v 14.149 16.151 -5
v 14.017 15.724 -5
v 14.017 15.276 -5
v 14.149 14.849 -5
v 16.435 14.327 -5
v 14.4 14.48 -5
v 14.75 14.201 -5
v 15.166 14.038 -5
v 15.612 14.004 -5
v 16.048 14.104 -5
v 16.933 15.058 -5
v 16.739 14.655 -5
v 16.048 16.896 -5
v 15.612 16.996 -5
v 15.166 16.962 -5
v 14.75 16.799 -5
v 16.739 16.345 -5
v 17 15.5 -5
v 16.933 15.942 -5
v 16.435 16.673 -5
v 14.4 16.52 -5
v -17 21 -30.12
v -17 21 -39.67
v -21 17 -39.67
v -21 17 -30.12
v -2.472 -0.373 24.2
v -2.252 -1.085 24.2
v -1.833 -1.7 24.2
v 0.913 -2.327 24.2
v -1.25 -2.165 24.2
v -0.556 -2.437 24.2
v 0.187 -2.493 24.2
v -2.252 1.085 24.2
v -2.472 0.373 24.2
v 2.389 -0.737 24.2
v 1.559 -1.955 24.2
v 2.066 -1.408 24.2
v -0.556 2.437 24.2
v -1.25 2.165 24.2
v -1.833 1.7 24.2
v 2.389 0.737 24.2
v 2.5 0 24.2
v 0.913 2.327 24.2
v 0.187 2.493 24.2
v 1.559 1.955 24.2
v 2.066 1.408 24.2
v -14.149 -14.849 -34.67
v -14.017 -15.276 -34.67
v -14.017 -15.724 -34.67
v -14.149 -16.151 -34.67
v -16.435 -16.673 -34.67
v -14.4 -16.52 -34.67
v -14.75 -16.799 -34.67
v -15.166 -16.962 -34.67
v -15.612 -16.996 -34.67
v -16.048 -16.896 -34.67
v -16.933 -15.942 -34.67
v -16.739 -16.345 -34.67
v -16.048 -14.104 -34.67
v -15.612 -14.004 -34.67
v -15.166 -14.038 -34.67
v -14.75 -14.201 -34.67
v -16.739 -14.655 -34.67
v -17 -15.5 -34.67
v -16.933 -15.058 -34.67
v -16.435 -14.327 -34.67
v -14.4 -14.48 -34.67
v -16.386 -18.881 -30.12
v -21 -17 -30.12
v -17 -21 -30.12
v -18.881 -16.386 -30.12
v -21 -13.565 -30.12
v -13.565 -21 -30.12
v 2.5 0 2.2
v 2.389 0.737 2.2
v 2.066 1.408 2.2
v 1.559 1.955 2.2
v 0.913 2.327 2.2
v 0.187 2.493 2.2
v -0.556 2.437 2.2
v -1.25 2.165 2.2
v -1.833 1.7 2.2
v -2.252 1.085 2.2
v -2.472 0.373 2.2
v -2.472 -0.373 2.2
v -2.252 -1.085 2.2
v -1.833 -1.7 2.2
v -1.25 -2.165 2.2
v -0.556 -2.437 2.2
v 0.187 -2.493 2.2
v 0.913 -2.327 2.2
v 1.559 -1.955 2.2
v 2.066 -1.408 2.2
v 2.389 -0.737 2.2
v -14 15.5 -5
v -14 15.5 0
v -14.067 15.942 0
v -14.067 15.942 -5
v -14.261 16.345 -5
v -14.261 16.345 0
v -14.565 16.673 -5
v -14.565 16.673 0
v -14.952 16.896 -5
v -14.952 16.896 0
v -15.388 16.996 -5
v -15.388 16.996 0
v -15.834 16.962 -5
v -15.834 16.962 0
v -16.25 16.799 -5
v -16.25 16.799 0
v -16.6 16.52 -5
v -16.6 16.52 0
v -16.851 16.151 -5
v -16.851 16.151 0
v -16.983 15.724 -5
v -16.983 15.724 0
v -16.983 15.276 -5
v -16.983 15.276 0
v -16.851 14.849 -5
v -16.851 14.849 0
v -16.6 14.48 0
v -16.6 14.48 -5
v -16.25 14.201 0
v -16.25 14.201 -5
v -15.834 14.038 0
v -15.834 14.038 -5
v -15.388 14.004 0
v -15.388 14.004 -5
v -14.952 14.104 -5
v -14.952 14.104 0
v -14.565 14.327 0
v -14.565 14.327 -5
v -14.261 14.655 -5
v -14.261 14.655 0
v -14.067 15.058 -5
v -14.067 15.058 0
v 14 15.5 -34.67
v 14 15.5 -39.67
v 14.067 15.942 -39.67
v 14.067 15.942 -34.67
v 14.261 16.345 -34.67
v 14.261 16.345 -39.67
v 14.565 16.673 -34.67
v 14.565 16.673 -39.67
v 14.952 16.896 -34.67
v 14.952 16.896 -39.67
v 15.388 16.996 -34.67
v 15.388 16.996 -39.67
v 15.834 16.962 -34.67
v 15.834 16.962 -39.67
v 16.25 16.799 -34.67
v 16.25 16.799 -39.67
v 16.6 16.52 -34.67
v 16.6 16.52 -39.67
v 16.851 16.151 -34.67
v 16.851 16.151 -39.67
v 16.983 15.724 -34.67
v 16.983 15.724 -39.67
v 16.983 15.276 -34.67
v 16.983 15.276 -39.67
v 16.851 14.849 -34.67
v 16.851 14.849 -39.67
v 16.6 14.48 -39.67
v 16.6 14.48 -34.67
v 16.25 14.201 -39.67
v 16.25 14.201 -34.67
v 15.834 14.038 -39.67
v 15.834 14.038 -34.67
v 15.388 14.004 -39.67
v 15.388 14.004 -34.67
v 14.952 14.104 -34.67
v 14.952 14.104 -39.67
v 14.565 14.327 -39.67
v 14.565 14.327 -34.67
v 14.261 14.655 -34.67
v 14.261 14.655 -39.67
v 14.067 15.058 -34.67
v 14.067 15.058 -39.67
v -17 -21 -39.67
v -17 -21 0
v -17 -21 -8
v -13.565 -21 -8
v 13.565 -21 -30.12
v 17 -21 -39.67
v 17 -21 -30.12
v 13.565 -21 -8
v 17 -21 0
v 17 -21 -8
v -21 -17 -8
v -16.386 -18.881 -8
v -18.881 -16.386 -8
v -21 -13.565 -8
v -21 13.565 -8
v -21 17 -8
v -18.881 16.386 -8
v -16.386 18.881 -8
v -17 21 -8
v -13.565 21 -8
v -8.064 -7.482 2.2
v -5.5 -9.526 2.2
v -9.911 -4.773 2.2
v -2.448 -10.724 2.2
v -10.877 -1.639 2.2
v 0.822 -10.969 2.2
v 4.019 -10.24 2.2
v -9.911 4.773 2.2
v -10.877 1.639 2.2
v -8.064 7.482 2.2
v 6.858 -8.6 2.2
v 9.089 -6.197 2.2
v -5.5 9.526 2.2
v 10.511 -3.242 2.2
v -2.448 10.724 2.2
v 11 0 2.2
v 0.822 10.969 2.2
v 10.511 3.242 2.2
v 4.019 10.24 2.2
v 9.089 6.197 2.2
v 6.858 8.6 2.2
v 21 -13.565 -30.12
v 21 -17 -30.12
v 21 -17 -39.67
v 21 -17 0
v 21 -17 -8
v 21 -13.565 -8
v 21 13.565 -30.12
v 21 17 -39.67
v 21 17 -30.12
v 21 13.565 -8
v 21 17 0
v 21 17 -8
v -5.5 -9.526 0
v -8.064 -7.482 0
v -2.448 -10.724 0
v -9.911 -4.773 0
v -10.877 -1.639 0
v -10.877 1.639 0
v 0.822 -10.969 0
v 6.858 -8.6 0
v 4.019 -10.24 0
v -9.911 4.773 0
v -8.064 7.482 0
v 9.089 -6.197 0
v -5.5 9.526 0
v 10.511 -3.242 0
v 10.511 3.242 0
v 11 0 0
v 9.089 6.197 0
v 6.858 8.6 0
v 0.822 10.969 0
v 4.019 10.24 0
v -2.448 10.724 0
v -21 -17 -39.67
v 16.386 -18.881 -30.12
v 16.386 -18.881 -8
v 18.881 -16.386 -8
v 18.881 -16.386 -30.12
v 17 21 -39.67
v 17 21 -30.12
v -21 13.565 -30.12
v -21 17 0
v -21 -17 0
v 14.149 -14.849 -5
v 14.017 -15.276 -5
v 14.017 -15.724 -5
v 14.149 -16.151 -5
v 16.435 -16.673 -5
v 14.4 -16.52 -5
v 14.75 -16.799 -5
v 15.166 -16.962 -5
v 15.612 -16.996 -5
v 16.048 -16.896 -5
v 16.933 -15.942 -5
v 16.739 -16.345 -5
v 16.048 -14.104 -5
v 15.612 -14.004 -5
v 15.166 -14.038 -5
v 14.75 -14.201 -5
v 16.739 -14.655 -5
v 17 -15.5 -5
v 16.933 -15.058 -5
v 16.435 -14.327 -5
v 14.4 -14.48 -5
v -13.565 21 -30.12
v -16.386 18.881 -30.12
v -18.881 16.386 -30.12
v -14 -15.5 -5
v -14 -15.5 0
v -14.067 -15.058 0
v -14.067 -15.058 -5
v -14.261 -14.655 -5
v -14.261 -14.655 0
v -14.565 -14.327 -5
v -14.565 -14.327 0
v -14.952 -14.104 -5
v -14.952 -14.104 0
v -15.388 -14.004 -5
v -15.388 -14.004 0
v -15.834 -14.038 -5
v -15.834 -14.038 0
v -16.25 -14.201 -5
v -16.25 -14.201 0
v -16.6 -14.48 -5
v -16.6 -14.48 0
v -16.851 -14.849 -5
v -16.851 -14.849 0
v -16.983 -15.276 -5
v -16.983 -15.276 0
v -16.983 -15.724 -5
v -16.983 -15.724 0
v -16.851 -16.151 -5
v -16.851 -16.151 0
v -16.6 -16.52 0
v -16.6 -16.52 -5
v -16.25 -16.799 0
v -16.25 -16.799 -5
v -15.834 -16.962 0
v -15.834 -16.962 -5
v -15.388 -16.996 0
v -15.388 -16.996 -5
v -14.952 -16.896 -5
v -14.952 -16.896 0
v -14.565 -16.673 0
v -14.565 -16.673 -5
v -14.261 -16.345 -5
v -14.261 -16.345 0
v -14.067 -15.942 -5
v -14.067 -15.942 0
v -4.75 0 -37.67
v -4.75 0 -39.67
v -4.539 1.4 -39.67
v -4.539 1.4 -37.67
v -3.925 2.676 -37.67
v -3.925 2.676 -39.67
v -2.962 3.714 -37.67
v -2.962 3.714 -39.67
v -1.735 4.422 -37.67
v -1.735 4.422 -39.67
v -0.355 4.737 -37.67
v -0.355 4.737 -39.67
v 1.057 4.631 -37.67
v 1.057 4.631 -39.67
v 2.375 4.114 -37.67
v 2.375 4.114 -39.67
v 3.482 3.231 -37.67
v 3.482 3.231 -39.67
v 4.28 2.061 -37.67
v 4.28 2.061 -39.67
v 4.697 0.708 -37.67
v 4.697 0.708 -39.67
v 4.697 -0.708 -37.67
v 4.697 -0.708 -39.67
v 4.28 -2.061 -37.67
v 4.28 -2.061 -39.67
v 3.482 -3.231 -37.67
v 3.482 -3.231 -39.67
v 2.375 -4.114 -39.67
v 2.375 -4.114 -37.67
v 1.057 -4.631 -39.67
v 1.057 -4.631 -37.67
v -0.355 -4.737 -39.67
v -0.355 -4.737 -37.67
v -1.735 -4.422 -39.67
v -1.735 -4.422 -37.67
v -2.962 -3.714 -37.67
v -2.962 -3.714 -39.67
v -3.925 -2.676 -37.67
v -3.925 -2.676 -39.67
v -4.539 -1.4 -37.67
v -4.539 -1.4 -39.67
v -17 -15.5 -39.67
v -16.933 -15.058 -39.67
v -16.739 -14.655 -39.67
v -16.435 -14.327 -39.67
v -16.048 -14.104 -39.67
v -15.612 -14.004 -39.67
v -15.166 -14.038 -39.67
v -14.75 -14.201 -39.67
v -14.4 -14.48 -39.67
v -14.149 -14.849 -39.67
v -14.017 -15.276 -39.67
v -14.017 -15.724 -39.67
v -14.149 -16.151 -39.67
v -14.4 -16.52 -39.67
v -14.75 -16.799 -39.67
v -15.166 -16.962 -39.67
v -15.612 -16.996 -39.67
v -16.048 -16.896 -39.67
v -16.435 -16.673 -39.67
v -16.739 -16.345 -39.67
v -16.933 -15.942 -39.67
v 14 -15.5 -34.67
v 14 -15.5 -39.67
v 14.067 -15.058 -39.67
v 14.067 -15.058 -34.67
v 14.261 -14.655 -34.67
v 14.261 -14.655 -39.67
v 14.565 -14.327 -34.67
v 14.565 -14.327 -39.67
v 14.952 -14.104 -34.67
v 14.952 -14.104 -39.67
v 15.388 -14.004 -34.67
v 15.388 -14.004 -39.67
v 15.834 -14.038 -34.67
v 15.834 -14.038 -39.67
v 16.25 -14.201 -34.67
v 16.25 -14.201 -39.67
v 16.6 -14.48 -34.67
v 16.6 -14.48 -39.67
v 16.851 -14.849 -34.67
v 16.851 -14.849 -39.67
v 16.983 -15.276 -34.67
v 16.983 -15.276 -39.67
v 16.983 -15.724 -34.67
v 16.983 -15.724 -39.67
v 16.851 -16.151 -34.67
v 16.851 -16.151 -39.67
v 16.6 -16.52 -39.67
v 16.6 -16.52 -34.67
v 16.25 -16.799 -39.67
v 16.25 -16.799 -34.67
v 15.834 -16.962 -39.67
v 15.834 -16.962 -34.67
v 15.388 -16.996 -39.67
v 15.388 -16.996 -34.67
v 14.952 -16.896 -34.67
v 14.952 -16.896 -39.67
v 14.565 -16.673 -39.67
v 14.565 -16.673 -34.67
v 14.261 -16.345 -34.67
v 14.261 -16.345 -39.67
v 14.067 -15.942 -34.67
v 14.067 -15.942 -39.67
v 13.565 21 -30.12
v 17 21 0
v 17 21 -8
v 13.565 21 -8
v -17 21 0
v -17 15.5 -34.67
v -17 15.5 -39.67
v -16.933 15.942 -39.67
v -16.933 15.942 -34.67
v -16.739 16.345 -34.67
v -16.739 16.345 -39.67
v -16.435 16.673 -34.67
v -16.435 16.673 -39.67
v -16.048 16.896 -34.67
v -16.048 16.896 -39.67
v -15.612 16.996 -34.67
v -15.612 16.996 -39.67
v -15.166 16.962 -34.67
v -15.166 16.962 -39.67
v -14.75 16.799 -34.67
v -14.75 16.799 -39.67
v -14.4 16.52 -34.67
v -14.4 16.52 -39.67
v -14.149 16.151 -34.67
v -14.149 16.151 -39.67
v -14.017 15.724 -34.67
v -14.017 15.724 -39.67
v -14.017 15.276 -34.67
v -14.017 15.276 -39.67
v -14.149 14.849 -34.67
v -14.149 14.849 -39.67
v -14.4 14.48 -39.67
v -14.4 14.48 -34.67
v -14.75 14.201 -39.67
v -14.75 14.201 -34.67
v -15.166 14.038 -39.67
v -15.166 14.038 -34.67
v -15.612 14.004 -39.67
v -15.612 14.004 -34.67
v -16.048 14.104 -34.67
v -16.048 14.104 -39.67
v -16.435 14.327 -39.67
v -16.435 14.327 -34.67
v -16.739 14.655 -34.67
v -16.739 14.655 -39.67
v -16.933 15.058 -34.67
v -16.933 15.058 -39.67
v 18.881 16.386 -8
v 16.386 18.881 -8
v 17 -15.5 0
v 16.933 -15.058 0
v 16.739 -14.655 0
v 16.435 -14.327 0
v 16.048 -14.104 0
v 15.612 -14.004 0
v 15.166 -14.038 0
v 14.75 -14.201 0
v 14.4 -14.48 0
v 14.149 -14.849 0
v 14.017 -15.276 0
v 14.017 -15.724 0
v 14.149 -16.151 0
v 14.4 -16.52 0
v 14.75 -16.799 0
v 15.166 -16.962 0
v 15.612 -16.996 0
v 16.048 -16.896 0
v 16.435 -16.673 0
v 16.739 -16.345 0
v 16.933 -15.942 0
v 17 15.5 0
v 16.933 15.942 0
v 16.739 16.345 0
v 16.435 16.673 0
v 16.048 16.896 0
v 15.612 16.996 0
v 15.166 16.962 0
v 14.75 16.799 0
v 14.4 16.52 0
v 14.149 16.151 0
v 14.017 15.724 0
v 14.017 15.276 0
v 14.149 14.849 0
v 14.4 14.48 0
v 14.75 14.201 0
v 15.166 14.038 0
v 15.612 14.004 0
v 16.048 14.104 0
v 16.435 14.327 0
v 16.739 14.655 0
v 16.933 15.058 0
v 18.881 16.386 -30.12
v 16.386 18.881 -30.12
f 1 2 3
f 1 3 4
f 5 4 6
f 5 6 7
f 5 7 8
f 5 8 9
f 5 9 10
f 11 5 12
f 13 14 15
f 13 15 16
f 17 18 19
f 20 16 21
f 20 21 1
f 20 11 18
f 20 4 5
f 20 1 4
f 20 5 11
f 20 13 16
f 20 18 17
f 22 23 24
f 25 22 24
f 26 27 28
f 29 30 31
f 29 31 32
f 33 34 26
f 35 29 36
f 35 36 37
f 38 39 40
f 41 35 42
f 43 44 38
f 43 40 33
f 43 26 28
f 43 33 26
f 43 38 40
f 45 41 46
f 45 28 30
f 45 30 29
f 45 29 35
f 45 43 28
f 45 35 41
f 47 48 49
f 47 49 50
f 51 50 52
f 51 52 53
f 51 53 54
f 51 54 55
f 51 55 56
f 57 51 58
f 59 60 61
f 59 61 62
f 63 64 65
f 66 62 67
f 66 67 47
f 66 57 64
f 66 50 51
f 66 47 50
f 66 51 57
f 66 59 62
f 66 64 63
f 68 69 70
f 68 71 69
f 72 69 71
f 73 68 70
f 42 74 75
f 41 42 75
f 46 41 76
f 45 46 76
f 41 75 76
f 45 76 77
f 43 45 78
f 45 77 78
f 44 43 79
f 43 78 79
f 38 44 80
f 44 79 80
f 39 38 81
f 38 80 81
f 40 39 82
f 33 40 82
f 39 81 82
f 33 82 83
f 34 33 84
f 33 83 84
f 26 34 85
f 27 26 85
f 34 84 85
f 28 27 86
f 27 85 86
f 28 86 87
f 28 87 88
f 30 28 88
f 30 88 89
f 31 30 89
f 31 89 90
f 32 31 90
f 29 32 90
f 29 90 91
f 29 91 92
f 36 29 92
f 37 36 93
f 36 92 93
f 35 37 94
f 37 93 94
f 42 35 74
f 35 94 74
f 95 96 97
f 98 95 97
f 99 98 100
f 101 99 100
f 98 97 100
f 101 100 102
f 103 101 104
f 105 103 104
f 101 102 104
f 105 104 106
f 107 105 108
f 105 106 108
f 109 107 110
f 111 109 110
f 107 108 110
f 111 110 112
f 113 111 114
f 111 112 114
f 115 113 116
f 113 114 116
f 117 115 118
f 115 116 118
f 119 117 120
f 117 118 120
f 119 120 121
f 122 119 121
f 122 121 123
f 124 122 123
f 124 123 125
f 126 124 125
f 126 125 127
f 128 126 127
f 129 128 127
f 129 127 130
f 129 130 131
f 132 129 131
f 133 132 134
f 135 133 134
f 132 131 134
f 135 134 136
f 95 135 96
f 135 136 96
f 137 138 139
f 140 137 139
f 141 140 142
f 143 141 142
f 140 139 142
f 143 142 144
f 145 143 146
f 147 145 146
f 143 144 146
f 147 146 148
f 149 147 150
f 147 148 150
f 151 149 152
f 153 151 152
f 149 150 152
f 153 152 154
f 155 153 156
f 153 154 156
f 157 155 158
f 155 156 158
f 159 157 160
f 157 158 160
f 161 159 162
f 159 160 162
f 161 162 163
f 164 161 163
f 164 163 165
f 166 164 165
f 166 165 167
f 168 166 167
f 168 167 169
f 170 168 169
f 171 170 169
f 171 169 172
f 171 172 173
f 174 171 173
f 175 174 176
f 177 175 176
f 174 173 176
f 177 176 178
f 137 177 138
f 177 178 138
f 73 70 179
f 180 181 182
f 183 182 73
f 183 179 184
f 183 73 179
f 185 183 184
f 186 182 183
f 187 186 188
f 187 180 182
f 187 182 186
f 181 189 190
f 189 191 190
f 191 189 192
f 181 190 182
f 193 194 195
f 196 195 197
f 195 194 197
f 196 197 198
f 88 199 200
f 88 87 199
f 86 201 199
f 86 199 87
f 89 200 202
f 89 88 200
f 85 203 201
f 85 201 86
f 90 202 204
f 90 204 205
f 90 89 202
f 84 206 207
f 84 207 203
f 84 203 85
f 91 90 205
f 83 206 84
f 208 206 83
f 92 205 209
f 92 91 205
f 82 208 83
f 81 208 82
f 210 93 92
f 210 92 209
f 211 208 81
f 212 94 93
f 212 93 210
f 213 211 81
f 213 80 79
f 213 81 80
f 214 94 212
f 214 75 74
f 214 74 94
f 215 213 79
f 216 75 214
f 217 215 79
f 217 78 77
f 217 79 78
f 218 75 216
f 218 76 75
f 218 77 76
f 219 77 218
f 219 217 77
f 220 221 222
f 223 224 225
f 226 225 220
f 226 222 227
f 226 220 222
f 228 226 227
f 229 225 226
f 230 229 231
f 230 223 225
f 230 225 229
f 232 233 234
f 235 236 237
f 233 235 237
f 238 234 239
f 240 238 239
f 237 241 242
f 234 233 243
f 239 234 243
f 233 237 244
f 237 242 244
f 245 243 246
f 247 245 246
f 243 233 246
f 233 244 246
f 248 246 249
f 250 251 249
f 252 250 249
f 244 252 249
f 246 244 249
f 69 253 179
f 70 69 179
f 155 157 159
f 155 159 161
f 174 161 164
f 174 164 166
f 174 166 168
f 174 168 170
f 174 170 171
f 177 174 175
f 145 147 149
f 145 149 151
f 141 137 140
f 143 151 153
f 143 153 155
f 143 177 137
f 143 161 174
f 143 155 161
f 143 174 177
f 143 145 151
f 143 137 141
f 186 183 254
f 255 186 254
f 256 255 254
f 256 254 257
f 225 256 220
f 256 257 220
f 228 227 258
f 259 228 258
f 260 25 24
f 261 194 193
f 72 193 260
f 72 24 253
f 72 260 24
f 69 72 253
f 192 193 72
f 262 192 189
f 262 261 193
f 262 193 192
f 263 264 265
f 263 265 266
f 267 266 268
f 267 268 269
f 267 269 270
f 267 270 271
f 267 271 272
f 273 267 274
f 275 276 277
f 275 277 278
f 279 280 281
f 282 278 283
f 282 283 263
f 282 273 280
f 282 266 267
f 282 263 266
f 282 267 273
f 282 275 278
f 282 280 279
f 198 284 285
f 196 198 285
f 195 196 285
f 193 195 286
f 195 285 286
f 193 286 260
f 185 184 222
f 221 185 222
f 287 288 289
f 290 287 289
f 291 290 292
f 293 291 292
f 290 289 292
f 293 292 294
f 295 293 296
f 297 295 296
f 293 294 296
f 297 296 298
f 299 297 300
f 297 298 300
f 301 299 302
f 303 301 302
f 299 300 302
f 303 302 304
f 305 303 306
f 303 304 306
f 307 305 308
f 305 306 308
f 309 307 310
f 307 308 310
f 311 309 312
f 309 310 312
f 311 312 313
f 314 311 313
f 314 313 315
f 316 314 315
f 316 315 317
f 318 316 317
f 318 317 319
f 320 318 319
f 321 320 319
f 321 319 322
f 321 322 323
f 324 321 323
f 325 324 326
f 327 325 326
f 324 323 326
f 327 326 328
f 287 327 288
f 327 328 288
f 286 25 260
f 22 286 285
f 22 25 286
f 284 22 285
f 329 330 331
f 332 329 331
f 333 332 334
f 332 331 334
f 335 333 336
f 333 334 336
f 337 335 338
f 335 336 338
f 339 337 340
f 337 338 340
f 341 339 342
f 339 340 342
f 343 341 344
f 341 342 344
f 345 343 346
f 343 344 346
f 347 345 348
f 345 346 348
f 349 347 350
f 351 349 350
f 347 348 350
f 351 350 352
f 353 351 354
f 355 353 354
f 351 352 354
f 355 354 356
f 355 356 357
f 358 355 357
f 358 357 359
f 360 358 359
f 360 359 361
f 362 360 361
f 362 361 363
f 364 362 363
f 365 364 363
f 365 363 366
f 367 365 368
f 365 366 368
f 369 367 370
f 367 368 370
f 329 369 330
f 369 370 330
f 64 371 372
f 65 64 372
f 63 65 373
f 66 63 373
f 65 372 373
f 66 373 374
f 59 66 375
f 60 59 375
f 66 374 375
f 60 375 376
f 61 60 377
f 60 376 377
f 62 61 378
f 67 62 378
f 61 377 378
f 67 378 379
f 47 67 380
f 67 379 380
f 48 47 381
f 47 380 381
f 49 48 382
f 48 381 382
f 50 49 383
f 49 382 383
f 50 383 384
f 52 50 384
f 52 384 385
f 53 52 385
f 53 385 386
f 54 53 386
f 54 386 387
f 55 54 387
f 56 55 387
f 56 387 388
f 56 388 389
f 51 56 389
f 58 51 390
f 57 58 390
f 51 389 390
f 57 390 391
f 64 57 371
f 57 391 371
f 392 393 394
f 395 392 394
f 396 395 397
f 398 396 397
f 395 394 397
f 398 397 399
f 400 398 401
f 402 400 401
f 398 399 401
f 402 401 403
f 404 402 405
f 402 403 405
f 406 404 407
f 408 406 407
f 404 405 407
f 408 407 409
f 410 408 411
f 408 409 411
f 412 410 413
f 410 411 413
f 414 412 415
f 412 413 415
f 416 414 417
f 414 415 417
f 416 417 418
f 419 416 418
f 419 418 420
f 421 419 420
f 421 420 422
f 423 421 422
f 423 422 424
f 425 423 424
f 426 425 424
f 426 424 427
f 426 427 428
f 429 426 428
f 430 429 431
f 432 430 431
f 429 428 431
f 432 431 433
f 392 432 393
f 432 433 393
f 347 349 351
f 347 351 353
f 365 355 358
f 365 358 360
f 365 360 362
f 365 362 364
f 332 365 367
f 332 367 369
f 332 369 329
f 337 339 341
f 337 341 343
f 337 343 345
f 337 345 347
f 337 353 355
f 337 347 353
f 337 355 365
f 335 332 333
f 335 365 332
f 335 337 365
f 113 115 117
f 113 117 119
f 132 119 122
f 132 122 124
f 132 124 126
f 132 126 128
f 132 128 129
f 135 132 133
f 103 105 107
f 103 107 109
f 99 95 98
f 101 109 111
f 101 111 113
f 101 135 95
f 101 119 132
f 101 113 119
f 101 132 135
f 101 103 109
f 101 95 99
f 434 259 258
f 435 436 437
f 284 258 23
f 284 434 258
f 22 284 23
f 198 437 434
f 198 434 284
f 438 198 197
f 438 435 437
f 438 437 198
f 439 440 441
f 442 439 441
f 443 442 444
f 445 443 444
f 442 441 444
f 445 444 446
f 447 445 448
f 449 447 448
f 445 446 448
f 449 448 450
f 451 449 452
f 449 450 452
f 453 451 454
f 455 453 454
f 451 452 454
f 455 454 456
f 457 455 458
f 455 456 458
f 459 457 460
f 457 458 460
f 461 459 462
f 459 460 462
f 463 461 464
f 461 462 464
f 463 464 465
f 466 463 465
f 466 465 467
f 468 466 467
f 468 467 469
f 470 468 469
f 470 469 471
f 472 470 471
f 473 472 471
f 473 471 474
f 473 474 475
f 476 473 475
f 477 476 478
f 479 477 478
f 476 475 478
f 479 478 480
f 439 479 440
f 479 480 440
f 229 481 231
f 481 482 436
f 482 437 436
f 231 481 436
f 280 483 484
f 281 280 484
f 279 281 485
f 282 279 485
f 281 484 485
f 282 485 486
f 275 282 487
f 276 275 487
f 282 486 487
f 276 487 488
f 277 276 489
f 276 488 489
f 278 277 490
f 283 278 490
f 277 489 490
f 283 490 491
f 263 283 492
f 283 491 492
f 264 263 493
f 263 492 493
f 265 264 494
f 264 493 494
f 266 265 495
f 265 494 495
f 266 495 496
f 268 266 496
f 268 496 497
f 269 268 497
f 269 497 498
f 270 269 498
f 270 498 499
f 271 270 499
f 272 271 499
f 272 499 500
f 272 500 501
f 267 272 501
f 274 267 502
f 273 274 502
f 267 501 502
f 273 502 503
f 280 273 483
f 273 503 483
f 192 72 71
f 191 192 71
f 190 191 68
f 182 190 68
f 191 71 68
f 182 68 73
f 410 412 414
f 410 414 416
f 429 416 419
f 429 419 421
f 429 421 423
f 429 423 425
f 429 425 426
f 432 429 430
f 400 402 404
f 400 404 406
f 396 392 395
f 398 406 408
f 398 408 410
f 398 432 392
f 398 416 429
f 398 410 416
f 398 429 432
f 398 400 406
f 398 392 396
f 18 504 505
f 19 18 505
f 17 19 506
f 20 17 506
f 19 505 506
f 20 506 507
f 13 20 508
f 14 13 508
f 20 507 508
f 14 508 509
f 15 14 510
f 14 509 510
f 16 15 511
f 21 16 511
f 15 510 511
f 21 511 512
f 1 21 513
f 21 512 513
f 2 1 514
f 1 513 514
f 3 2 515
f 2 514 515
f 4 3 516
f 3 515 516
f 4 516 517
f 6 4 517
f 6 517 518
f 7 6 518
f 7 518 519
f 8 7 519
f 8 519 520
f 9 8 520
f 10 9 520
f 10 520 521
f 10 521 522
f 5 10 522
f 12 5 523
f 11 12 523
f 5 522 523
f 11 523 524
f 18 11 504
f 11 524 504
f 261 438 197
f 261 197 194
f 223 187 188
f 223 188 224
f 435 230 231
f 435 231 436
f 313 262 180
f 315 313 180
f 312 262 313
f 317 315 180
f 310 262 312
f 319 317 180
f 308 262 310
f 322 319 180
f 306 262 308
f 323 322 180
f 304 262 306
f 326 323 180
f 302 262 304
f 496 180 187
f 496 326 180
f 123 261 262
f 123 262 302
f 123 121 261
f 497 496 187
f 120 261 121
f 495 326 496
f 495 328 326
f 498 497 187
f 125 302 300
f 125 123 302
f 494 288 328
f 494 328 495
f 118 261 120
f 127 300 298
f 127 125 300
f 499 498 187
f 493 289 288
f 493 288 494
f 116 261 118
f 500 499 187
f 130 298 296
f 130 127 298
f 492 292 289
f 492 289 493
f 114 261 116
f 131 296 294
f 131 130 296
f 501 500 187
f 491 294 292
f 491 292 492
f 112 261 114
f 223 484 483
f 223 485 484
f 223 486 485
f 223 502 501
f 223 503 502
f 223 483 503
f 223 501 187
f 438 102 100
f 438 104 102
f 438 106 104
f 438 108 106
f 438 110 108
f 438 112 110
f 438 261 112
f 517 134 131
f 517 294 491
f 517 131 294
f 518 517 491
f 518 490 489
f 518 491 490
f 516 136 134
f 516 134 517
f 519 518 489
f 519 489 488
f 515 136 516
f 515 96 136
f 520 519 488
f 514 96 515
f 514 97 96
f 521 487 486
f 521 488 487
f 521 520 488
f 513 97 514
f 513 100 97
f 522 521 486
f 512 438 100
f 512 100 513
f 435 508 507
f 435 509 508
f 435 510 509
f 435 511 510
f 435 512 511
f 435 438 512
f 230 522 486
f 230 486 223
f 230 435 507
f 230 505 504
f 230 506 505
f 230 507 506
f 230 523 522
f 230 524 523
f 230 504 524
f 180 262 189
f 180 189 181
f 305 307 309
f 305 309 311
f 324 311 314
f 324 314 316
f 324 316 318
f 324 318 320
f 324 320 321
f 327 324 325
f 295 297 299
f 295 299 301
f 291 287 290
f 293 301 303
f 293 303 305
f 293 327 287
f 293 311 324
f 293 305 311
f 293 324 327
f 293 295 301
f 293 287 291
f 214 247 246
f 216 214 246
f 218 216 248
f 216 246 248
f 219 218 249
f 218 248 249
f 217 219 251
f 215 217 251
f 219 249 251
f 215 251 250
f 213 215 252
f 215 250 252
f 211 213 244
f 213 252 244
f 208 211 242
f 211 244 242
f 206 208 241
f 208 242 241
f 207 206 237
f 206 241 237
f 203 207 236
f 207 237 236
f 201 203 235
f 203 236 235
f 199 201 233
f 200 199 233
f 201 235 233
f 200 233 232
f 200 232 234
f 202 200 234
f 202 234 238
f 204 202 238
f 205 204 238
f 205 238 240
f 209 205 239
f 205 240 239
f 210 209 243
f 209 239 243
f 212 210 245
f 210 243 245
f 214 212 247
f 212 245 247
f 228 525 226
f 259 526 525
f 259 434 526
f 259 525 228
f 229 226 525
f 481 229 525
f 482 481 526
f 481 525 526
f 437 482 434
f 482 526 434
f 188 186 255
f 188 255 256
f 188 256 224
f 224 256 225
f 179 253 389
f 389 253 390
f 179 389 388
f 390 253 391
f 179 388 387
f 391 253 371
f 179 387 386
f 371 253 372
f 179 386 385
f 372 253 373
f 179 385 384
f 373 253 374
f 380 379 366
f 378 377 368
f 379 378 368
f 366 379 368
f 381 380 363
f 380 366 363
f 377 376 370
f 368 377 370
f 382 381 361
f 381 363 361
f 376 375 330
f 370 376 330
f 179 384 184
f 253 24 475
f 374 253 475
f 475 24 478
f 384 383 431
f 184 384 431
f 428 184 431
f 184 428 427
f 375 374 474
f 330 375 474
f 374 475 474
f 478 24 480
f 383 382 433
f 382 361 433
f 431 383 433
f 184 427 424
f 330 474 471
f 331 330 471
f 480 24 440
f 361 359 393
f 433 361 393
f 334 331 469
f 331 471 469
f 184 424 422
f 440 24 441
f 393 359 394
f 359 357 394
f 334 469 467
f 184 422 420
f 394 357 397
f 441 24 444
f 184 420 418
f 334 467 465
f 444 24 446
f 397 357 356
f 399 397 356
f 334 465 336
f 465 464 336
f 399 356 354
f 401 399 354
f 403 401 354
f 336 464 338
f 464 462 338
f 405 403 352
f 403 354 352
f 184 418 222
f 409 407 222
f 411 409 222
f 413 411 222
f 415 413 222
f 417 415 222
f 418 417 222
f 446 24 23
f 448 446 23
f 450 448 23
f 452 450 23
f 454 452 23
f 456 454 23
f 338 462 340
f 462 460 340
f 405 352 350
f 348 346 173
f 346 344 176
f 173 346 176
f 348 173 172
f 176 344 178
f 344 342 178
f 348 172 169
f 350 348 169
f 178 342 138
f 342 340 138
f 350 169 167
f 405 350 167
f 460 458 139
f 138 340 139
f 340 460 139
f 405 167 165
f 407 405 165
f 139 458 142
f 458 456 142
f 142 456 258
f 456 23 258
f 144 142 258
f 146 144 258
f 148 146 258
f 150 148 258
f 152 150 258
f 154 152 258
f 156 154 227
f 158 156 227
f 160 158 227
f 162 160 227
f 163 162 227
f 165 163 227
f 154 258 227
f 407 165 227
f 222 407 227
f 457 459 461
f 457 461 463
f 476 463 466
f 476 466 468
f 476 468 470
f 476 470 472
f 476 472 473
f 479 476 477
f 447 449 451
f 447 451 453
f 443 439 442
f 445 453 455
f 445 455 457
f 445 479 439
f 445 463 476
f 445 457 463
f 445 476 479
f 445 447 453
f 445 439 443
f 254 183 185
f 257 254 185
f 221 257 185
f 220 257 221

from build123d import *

# Parameters (mm, degrees)
BOSS_EXTRUDE1_DEPTH = 39.67
SKETCH2_OUTSIDE_W   = 58.286
SKETCH2_OUTSIDE_H   = 58.286
SKETCH2_OUTSIDE_R   = 25
CUT_EXTRUDE1_DEPTH  = 22.12
SKETCH3_R           = 1.5
CUT_EXTRUDE2_DEPTH  = 5
SKETCH4_R           = 4.75
CUT_EXTRUDE3_DEPTH  = 2
SKETCH5_R           = 1.5
CUT_EXTRUDE4_DEPTH  = 5
SKETCH6_R           = 11
BOSS_EXTRUDE2_DEPTH = 2.2
SKETCH8_R           = 2.5
BOSS_EXTRUDE3_DEPTH = 22


with BuildPart() as part:
    # Sketch1 → Boss-Extrude1 (new body)
    with BuildSketch(Plane.XY):
        Polygon((17, -21), (21, -17), (21, 17), (17, 21), (-17, 21), (-21, 17), (-21, -17), (-17, -21), align=None)
    extrude(amount=-BOSS_EXTRUDE1_DEPTH)

    # Sketch2 outside → Cut-Extrude1 (cut)
    with BuildSketch(Plane.XY.offset(-30.12)):
        Rectangle(SKETCH2_OUTSIDE_W, SKETCH2_OUTSIDE_H)
        Circle(SKETCH2_OUTSIDE_R, mode=Mode.SUBTRACT)
    extrude(amount=CUT_EXTRUDE1_DEPTH, mode=Mode.SUBTRACT)

    # Sketch3 → Cut-Extrude2 (cut)
    with BuildSketch(Plane(origin=(0, 0, -39.67), x_dir=(-1, 0, 0), z_dir=(0, 0, -1))):
        with Locations((15.5, 15.5)):
            Circle(SKETCH3_R)
        with Locations((15.5, -15.5)):
            Circle(SKETCH3_R)
        with Locations((-15.5, -15.5)):
            Circle(SKETCH3_R)
        with Locations((-15.5, 15.5)):
            Circle(SKETCH3_R)
    extrude(amount=-CUT_EXTRUDE2_DEPTH, mode=Mode.SUBTRACT)

    # Sketch4 → Cut-Extrude3 (cut)
    with BuildSketch(Plane(origin=(0, 0, -39.67), x_dir=(-1, 0, 0), z_dir=(0, 0, -1))):
        Circle(SKETCH4_R)
    extrude(amount=-CUT_EXTRUDE3_DEPTH, mode=Mode.SUBTRACT)

    # Sketch5 → Cut-Extrude4 (cut)
    with BuildSketch(Plane.XY):
        with Locations((15.5, 15.5)):
            Circle(SKETCH5_R)
        with Locations((-15.5, 15.5)):
            Circle(SKETCH5_R)
        with Locations((-15.5, -15.5)):
            Circle(SKETCH5_R)
        with Locations((15.5, -15.5)):
            Circle(SKETCH5_R)
    extrude(amount=-CUT_EXTRUDE4_DEPTH, mode=Mode.SUBTRACT)


with BuildPart() as body_2:
    # Sketch6 → Boss-Extrude2 (new body)
    with BuildSketch(Plane.XY):
        Circle(SKETCH6_R)
    extrude(amount=BOSS_EXTRUDE2_DEPTH)

    # Sketch8 → Boss-Extrude3 (add)
    with BuildSketch(Plane.XY.offset(2.2)):
        Circle(SKETCH8_R)
    extrude(amount=BOSS_EXTRUDE3_DEPTH)


solid = Compound([part.part, body_2.part])
